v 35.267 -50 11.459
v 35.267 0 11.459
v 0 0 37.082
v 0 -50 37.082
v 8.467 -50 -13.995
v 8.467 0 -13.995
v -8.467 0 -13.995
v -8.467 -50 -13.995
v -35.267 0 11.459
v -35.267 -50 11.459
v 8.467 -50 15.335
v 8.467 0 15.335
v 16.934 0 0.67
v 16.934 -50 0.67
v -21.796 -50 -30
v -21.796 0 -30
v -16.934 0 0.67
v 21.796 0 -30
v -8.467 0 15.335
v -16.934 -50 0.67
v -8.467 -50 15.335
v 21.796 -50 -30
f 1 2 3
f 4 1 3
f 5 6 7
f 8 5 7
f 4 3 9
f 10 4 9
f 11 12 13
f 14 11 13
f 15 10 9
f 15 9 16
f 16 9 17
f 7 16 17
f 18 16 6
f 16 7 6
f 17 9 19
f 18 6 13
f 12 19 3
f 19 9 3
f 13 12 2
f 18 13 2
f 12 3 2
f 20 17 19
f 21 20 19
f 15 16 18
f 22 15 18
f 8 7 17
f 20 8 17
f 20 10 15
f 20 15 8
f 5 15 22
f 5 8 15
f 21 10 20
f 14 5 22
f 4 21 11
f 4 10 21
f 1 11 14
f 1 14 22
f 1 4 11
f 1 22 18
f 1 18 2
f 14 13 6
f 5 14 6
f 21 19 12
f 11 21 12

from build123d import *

# Parameters (mm, degrees)
F1_DEPTH = 50


with BuildPart() as f1:
    # F0 (on Front) → F1 (new body)
    with BuildSketch(Plane.XZ):
        Polygon((-35.267115, 11.45898), (-21.796276, -30), (21.796276, -30), (35.267115, 11.45898), (0, 37.082039), align=None)
        Polygon((-16.933772, 0.669846), (-8.466886, 15.334923), (8.466886, 15.334923), (16.933772, 0.669846), (8.466886, -13.995231), (-8.466886, -13.995231), align=None, mode=Mode.SUBTRACT)
    extrude(amount=F1_DEPTH)


solid = f1.part
